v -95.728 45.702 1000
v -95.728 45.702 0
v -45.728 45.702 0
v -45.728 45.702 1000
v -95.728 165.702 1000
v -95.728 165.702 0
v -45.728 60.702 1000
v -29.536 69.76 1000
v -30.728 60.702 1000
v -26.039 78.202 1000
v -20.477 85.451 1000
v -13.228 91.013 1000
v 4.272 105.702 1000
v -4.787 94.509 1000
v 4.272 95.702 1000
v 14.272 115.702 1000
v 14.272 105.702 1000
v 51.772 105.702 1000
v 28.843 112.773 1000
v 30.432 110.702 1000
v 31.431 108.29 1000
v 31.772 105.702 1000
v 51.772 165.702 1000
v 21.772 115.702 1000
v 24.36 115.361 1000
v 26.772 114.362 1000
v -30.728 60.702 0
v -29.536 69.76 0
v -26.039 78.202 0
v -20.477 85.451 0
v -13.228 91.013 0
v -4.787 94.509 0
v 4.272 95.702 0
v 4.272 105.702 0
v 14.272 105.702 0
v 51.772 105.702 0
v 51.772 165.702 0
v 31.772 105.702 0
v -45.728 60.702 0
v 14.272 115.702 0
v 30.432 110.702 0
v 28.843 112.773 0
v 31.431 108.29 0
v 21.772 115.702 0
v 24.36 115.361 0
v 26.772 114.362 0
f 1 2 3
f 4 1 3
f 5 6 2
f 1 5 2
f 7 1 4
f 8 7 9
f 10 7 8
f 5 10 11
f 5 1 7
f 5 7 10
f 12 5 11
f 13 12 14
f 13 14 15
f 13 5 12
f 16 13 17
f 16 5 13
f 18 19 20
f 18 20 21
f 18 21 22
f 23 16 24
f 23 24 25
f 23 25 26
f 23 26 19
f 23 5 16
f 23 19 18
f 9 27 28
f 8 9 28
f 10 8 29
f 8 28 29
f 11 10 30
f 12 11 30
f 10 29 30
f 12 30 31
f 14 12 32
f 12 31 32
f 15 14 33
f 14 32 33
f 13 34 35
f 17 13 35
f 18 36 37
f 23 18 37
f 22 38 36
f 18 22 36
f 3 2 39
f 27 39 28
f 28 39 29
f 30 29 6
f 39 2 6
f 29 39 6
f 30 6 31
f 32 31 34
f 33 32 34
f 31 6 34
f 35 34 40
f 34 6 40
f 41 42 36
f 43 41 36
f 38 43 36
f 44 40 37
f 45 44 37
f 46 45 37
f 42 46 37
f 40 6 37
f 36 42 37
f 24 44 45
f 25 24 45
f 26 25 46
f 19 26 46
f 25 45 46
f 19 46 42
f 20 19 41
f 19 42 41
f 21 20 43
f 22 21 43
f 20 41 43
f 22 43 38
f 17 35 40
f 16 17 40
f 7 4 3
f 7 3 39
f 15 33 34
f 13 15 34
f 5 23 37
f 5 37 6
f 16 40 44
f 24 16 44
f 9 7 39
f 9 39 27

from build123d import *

# Parameters (mm, degrees)
F1_DEPTH = 1000


with BuildPart() as f1:
    # F0 (on Top) → F1 (new body)
    with BuildSketch(Plane.XY):
        with BuildLine():
            Line((51.771715, 105.701796), (51.771715, 165.701796))
            Line((51.771715, 165.701796), (-95.728285, 165.701796))
            Line((-95.728285, 165.701796), (-95.728285, 45.701796))
            Line((-95.728285, 45.701796), (-45.728285, 45.701796))
            Line((-45.728285, 45.701796), (-45.728285, 60.701796))
            Line((-45.728285, 60.701796), (-30.728285, 60.701796))
            ThreePointArc((-30.728285, 60.701796), (-20.477022, 85.450533), (4.271715, 95.701796))
            Line((4.271715, 95.701796), (4.271715, 105.701796))
            Line((4.271715, 105.701796), (14.271715, 105.701796))
            Line((14.271715, 105.701796), (14.271715, 115.701796))
            Line((14.271715, 115.701796), (21.771715, 115.701796))
            ThreePointArc((21.771715, 115.701796), (28.842783, 112.772864), (31.771715, 105.701796))
            Line((31.771715, 105.701796), (51.771715, 105.701796))
        make_face()
    extrude(amount=F1_DEPTH)


solid = f1.part
